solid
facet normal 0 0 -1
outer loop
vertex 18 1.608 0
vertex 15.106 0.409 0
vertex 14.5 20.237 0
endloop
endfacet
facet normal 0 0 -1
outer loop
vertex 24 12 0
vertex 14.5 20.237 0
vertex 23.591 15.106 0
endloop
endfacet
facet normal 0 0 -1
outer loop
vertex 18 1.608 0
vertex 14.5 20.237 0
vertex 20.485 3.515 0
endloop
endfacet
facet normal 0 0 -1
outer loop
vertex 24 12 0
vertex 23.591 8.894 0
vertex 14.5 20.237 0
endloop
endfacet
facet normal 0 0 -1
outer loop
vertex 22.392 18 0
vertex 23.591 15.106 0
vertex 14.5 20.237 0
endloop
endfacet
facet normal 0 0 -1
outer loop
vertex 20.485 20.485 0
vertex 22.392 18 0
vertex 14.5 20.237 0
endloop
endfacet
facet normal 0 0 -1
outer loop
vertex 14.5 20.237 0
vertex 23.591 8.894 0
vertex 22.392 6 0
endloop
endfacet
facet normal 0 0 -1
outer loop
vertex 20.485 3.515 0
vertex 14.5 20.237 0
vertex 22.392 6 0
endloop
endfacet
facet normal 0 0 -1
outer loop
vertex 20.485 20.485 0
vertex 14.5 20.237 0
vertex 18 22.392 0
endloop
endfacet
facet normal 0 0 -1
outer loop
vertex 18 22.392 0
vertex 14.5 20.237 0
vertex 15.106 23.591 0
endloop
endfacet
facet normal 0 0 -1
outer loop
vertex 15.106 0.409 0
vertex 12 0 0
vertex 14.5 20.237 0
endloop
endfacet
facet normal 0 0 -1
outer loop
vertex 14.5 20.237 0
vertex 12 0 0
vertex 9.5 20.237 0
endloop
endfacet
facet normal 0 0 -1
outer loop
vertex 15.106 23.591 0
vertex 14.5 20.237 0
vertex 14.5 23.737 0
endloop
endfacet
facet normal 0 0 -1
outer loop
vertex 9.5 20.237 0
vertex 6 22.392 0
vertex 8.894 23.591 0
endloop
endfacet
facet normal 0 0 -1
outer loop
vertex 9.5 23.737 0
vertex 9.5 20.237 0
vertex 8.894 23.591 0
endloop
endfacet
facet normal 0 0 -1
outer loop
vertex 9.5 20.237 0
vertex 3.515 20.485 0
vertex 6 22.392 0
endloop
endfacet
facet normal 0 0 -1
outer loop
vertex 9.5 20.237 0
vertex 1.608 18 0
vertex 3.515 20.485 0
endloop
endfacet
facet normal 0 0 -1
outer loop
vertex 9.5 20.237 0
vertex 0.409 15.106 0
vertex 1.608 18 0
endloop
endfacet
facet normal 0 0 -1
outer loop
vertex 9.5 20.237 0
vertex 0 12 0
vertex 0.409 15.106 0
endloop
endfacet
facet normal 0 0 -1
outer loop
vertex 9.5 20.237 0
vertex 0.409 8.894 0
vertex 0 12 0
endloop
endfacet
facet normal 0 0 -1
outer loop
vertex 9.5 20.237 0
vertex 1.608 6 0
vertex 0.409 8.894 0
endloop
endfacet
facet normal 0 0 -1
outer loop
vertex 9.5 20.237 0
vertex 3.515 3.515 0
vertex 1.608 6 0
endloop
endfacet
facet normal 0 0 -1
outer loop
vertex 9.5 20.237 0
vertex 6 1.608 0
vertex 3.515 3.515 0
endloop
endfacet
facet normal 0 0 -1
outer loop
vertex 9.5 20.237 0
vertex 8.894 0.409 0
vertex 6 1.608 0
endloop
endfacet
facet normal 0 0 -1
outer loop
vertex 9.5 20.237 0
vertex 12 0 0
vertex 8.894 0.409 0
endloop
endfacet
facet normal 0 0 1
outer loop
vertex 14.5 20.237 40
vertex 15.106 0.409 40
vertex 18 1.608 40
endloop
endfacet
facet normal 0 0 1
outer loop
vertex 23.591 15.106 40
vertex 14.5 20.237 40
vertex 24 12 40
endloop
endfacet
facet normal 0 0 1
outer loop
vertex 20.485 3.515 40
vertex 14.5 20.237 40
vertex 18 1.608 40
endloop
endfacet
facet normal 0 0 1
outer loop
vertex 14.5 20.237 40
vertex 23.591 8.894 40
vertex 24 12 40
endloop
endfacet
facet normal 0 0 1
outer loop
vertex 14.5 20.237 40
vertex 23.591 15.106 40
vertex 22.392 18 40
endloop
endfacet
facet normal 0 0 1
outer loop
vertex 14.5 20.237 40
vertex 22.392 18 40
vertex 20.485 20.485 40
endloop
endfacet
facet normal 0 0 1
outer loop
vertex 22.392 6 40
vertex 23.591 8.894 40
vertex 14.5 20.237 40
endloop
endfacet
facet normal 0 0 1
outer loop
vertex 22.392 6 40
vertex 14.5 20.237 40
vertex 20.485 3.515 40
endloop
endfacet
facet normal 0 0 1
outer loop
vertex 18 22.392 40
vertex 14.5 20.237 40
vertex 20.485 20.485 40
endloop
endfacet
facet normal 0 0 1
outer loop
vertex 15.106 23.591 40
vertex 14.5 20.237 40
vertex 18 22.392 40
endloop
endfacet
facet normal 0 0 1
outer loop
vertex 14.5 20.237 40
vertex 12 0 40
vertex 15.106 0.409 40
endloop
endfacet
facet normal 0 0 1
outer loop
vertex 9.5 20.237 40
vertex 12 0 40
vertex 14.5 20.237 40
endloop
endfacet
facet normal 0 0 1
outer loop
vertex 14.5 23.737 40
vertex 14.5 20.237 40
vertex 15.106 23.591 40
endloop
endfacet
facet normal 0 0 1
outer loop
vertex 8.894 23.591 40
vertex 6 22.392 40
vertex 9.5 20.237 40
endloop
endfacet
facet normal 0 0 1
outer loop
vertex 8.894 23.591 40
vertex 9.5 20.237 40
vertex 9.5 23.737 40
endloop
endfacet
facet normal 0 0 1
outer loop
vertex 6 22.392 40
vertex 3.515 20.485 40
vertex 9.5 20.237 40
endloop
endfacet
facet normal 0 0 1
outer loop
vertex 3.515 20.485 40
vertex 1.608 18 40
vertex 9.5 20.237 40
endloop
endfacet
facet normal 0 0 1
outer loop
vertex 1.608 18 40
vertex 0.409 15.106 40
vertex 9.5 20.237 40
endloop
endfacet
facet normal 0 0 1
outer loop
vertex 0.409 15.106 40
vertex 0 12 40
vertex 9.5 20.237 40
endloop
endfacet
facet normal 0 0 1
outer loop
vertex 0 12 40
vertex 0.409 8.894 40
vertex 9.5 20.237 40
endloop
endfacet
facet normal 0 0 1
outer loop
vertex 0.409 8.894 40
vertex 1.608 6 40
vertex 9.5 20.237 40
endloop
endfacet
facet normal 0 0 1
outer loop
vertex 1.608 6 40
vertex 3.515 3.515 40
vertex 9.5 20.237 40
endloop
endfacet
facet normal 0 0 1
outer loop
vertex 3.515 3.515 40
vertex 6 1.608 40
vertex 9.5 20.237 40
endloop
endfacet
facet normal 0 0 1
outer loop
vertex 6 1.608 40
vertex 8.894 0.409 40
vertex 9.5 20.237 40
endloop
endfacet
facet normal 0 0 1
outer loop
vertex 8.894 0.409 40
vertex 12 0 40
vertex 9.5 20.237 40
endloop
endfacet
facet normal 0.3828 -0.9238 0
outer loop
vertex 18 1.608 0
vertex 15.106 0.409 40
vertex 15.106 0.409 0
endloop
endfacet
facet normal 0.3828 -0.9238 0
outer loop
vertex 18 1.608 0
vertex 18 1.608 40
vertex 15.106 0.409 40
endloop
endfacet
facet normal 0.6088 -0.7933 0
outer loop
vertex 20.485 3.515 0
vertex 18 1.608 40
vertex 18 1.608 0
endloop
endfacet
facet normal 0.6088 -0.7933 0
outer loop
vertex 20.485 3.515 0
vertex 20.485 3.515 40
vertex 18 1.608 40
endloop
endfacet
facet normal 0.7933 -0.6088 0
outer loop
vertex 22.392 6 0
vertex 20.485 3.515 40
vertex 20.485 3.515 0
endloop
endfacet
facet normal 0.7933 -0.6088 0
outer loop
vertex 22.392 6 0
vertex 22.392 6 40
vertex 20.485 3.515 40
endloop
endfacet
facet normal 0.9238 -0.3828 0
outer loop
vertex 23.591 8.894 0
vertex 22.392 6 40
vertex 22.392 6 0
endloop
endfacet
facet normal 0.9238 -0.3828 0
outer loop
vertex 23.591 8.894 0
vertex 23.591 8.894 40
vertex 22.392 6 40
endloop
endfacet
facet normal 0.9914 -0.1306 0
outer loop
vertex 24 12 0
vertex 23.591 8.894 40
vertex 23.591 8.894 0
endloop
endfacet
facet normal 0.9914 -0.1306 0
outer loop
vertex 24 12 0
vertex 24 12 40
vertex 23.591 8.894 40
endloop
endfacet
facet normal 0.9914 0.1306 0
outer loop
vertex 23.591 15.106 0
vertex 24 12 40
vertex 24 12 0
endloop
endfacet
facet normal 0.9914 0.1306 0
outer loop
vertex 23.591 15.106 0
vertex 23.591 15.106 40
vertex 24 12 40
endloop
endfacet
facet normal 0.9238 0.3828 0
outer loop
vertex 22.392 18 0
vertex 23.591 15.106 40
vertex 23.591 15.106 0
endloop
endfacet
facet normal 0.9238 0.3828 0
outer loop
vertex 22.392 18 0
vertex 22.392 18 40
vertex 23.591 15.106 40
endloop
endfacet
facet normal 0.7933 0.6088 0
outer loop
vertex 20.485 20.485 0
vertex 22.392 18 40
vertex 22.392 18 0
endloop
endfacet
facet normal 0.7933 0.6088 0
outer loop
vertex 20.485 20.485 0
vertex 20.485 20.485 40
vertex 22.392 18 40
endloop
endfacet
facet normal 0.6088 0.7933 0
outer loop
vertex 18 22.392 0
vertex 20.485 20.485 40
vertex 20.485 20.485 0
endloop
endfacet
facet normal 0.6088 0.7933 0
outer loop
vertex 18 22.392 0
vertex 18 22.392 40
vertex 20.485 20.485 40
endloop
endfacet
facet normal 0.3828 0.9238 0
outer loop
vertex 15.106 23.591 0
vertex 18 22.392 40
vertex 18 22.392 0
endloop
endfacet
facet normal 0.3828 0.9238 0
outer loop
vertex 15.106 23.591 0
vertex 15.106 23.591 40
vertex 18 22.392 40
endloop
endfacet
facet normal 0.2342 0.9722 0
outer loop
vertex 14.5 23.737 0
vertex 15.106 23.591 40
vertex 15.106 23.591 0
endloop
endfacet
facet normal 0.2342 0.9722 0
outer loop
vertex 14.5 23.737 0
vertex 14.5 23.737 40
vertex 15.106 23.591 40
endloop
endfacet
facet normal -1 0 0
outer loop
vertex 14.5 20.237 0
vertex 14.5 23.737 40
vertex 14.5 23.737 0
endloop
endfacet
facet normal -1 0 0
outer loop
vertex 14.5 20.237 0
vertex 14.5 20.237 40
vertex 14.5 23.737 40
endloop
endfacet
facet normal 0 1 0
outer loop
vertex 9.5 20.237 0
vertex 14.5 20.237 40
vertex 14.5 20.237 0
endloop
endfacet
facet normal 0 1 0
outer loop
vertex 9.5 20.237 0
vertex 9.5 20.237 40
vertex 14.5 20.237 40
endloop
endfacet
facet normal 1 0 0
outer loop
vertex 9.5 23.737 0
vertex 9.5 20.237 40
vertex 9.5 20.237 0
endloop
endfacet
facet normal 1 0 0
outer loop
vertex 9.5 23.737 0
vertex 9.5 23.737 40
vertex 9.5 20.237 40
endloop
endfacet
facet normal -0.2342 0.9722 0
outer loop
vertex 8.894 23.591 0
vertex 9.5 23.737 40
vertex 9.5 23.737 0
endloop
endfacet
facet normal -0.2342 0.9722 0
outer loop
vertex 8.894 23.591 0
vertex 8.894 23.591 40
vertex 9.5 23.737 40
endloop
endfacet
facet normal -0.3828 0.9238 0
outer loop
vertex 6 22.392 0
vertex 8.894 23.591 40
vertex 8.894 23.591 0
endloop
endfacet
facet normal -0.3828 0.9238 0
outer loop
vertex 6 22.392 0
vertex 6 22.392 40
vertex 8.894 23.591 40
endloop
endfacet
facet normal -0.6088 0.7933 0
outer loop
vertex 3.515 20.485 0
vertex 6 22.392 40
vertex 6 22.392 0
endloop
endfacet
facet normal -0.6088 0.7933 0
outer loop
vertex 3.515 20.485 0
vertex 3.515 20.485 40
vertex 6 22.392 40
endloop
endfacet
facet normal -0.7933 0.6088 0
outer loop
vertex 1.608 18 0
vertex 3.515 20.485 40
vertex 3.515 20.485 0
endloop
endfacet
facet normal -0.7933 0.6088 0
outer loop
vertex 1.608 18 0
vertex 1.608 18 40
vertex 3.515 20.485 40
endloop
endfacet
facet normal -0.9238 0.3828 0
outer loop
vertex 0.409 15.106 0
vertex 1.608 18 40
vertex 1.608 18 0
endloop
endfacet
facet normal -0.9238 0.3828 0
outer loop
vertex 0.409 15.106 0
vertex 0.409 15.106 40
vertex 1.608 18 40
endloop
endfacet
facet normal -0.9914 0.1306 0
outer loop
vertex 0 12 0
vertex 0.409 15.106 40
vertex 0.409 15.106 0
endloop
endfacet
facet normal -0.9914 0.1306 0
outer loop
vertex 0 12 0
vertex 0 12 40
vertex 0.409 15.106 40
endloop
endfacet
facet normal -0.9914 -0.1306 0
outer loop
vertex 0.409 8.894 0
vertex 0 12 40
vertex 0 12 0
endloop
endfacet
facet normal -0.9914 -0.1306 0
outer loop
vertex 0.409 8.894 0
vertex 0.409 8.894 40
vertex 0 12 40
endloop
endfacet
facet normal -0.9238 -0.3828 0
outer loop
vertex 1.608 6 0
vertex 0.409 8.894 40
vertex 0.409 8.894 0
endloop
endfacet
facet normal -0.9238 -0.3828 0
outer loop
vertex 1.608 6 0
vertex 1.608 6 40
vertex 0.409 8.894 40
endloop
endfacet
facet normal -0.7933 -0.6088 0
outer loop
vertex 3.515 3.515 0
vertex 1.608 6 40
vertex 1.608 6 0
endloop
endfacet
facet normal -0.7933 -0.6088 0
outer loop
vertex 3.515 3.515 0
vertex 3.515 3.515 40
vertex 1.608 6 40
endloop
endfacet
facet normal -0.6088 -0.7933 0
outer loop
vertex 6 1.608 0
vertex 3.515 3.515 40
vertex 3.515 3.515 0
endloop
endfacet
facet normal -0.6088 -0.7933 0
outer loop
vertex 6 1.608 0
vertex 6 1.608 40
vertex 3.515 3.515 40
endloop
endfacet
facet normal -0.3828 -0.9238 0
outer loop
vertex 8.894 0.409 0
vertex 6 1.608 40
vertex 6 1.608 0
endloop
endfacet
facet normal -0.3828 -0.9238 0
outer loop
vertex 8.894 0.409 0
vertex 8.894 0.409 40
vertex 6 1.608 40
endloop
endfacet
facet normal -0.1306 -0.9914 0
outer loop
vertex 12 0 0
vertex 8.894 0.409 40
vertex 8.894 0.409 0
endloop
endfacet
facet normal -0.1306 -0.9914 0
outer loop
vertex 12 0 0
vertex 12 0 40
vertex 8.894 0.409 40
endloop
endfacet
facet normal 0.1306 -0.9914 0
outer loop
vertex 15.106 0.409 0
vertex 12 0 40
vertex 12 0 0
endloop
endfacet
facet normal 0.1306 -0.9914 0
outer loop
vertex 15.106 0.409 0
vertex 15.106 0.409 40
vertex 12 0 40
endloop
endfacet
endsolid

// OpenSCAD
$fn = 32;

// ----------------------------------------------------------------------
// Keyway shaft: d24 shaft, key 5 x 3.5 mm
// ----------------------------------------------------------------------

// --- parameters (mm) ---
shaft_r = 12;             // shaft radius
key_w = 5;                // keyway width
key_d = 3.5;              // keyway depth below the surface line
plate_t = 40;             // shaft length, Z (extrusion height)
fit_tol = 0.02;           // declared fit tolerance (prompt contract)
free_tol = 0.2;           // declared free tolerance (prompt contract)

shaft_d = 2 * shaft_r;  // shaft diameter
circle_step = 15;  // polygon sampling step, degrees

profile = [[8.894, 23.591], [6, 22.392], [3.515, 20.485], [1.608, 18], [0.409, 15.106], [0, 12], [0.409, 8.894], [1.608, 6], [3.515, 3.515], [6, 1.608], [8.894, 0.409], [12, 0], [15.106, 0.409], [18, 1.608], [20.485, 3.515], [22.392, 6], [23.591, 8.894], [24, 12], [23.591, 15.106], [22.392, 18], [20.485, 20.485], [18, 22.392], [15.106, 23.591], [14.5, 23.737], [14.5, 20.237], [9.5, 20.237], [9.5, 23.737]];  // primary outline, 27 points, counter clockwise

// --- the one profile operation ---
linear_extrude(height = plate_t) polygon(points = profile);
